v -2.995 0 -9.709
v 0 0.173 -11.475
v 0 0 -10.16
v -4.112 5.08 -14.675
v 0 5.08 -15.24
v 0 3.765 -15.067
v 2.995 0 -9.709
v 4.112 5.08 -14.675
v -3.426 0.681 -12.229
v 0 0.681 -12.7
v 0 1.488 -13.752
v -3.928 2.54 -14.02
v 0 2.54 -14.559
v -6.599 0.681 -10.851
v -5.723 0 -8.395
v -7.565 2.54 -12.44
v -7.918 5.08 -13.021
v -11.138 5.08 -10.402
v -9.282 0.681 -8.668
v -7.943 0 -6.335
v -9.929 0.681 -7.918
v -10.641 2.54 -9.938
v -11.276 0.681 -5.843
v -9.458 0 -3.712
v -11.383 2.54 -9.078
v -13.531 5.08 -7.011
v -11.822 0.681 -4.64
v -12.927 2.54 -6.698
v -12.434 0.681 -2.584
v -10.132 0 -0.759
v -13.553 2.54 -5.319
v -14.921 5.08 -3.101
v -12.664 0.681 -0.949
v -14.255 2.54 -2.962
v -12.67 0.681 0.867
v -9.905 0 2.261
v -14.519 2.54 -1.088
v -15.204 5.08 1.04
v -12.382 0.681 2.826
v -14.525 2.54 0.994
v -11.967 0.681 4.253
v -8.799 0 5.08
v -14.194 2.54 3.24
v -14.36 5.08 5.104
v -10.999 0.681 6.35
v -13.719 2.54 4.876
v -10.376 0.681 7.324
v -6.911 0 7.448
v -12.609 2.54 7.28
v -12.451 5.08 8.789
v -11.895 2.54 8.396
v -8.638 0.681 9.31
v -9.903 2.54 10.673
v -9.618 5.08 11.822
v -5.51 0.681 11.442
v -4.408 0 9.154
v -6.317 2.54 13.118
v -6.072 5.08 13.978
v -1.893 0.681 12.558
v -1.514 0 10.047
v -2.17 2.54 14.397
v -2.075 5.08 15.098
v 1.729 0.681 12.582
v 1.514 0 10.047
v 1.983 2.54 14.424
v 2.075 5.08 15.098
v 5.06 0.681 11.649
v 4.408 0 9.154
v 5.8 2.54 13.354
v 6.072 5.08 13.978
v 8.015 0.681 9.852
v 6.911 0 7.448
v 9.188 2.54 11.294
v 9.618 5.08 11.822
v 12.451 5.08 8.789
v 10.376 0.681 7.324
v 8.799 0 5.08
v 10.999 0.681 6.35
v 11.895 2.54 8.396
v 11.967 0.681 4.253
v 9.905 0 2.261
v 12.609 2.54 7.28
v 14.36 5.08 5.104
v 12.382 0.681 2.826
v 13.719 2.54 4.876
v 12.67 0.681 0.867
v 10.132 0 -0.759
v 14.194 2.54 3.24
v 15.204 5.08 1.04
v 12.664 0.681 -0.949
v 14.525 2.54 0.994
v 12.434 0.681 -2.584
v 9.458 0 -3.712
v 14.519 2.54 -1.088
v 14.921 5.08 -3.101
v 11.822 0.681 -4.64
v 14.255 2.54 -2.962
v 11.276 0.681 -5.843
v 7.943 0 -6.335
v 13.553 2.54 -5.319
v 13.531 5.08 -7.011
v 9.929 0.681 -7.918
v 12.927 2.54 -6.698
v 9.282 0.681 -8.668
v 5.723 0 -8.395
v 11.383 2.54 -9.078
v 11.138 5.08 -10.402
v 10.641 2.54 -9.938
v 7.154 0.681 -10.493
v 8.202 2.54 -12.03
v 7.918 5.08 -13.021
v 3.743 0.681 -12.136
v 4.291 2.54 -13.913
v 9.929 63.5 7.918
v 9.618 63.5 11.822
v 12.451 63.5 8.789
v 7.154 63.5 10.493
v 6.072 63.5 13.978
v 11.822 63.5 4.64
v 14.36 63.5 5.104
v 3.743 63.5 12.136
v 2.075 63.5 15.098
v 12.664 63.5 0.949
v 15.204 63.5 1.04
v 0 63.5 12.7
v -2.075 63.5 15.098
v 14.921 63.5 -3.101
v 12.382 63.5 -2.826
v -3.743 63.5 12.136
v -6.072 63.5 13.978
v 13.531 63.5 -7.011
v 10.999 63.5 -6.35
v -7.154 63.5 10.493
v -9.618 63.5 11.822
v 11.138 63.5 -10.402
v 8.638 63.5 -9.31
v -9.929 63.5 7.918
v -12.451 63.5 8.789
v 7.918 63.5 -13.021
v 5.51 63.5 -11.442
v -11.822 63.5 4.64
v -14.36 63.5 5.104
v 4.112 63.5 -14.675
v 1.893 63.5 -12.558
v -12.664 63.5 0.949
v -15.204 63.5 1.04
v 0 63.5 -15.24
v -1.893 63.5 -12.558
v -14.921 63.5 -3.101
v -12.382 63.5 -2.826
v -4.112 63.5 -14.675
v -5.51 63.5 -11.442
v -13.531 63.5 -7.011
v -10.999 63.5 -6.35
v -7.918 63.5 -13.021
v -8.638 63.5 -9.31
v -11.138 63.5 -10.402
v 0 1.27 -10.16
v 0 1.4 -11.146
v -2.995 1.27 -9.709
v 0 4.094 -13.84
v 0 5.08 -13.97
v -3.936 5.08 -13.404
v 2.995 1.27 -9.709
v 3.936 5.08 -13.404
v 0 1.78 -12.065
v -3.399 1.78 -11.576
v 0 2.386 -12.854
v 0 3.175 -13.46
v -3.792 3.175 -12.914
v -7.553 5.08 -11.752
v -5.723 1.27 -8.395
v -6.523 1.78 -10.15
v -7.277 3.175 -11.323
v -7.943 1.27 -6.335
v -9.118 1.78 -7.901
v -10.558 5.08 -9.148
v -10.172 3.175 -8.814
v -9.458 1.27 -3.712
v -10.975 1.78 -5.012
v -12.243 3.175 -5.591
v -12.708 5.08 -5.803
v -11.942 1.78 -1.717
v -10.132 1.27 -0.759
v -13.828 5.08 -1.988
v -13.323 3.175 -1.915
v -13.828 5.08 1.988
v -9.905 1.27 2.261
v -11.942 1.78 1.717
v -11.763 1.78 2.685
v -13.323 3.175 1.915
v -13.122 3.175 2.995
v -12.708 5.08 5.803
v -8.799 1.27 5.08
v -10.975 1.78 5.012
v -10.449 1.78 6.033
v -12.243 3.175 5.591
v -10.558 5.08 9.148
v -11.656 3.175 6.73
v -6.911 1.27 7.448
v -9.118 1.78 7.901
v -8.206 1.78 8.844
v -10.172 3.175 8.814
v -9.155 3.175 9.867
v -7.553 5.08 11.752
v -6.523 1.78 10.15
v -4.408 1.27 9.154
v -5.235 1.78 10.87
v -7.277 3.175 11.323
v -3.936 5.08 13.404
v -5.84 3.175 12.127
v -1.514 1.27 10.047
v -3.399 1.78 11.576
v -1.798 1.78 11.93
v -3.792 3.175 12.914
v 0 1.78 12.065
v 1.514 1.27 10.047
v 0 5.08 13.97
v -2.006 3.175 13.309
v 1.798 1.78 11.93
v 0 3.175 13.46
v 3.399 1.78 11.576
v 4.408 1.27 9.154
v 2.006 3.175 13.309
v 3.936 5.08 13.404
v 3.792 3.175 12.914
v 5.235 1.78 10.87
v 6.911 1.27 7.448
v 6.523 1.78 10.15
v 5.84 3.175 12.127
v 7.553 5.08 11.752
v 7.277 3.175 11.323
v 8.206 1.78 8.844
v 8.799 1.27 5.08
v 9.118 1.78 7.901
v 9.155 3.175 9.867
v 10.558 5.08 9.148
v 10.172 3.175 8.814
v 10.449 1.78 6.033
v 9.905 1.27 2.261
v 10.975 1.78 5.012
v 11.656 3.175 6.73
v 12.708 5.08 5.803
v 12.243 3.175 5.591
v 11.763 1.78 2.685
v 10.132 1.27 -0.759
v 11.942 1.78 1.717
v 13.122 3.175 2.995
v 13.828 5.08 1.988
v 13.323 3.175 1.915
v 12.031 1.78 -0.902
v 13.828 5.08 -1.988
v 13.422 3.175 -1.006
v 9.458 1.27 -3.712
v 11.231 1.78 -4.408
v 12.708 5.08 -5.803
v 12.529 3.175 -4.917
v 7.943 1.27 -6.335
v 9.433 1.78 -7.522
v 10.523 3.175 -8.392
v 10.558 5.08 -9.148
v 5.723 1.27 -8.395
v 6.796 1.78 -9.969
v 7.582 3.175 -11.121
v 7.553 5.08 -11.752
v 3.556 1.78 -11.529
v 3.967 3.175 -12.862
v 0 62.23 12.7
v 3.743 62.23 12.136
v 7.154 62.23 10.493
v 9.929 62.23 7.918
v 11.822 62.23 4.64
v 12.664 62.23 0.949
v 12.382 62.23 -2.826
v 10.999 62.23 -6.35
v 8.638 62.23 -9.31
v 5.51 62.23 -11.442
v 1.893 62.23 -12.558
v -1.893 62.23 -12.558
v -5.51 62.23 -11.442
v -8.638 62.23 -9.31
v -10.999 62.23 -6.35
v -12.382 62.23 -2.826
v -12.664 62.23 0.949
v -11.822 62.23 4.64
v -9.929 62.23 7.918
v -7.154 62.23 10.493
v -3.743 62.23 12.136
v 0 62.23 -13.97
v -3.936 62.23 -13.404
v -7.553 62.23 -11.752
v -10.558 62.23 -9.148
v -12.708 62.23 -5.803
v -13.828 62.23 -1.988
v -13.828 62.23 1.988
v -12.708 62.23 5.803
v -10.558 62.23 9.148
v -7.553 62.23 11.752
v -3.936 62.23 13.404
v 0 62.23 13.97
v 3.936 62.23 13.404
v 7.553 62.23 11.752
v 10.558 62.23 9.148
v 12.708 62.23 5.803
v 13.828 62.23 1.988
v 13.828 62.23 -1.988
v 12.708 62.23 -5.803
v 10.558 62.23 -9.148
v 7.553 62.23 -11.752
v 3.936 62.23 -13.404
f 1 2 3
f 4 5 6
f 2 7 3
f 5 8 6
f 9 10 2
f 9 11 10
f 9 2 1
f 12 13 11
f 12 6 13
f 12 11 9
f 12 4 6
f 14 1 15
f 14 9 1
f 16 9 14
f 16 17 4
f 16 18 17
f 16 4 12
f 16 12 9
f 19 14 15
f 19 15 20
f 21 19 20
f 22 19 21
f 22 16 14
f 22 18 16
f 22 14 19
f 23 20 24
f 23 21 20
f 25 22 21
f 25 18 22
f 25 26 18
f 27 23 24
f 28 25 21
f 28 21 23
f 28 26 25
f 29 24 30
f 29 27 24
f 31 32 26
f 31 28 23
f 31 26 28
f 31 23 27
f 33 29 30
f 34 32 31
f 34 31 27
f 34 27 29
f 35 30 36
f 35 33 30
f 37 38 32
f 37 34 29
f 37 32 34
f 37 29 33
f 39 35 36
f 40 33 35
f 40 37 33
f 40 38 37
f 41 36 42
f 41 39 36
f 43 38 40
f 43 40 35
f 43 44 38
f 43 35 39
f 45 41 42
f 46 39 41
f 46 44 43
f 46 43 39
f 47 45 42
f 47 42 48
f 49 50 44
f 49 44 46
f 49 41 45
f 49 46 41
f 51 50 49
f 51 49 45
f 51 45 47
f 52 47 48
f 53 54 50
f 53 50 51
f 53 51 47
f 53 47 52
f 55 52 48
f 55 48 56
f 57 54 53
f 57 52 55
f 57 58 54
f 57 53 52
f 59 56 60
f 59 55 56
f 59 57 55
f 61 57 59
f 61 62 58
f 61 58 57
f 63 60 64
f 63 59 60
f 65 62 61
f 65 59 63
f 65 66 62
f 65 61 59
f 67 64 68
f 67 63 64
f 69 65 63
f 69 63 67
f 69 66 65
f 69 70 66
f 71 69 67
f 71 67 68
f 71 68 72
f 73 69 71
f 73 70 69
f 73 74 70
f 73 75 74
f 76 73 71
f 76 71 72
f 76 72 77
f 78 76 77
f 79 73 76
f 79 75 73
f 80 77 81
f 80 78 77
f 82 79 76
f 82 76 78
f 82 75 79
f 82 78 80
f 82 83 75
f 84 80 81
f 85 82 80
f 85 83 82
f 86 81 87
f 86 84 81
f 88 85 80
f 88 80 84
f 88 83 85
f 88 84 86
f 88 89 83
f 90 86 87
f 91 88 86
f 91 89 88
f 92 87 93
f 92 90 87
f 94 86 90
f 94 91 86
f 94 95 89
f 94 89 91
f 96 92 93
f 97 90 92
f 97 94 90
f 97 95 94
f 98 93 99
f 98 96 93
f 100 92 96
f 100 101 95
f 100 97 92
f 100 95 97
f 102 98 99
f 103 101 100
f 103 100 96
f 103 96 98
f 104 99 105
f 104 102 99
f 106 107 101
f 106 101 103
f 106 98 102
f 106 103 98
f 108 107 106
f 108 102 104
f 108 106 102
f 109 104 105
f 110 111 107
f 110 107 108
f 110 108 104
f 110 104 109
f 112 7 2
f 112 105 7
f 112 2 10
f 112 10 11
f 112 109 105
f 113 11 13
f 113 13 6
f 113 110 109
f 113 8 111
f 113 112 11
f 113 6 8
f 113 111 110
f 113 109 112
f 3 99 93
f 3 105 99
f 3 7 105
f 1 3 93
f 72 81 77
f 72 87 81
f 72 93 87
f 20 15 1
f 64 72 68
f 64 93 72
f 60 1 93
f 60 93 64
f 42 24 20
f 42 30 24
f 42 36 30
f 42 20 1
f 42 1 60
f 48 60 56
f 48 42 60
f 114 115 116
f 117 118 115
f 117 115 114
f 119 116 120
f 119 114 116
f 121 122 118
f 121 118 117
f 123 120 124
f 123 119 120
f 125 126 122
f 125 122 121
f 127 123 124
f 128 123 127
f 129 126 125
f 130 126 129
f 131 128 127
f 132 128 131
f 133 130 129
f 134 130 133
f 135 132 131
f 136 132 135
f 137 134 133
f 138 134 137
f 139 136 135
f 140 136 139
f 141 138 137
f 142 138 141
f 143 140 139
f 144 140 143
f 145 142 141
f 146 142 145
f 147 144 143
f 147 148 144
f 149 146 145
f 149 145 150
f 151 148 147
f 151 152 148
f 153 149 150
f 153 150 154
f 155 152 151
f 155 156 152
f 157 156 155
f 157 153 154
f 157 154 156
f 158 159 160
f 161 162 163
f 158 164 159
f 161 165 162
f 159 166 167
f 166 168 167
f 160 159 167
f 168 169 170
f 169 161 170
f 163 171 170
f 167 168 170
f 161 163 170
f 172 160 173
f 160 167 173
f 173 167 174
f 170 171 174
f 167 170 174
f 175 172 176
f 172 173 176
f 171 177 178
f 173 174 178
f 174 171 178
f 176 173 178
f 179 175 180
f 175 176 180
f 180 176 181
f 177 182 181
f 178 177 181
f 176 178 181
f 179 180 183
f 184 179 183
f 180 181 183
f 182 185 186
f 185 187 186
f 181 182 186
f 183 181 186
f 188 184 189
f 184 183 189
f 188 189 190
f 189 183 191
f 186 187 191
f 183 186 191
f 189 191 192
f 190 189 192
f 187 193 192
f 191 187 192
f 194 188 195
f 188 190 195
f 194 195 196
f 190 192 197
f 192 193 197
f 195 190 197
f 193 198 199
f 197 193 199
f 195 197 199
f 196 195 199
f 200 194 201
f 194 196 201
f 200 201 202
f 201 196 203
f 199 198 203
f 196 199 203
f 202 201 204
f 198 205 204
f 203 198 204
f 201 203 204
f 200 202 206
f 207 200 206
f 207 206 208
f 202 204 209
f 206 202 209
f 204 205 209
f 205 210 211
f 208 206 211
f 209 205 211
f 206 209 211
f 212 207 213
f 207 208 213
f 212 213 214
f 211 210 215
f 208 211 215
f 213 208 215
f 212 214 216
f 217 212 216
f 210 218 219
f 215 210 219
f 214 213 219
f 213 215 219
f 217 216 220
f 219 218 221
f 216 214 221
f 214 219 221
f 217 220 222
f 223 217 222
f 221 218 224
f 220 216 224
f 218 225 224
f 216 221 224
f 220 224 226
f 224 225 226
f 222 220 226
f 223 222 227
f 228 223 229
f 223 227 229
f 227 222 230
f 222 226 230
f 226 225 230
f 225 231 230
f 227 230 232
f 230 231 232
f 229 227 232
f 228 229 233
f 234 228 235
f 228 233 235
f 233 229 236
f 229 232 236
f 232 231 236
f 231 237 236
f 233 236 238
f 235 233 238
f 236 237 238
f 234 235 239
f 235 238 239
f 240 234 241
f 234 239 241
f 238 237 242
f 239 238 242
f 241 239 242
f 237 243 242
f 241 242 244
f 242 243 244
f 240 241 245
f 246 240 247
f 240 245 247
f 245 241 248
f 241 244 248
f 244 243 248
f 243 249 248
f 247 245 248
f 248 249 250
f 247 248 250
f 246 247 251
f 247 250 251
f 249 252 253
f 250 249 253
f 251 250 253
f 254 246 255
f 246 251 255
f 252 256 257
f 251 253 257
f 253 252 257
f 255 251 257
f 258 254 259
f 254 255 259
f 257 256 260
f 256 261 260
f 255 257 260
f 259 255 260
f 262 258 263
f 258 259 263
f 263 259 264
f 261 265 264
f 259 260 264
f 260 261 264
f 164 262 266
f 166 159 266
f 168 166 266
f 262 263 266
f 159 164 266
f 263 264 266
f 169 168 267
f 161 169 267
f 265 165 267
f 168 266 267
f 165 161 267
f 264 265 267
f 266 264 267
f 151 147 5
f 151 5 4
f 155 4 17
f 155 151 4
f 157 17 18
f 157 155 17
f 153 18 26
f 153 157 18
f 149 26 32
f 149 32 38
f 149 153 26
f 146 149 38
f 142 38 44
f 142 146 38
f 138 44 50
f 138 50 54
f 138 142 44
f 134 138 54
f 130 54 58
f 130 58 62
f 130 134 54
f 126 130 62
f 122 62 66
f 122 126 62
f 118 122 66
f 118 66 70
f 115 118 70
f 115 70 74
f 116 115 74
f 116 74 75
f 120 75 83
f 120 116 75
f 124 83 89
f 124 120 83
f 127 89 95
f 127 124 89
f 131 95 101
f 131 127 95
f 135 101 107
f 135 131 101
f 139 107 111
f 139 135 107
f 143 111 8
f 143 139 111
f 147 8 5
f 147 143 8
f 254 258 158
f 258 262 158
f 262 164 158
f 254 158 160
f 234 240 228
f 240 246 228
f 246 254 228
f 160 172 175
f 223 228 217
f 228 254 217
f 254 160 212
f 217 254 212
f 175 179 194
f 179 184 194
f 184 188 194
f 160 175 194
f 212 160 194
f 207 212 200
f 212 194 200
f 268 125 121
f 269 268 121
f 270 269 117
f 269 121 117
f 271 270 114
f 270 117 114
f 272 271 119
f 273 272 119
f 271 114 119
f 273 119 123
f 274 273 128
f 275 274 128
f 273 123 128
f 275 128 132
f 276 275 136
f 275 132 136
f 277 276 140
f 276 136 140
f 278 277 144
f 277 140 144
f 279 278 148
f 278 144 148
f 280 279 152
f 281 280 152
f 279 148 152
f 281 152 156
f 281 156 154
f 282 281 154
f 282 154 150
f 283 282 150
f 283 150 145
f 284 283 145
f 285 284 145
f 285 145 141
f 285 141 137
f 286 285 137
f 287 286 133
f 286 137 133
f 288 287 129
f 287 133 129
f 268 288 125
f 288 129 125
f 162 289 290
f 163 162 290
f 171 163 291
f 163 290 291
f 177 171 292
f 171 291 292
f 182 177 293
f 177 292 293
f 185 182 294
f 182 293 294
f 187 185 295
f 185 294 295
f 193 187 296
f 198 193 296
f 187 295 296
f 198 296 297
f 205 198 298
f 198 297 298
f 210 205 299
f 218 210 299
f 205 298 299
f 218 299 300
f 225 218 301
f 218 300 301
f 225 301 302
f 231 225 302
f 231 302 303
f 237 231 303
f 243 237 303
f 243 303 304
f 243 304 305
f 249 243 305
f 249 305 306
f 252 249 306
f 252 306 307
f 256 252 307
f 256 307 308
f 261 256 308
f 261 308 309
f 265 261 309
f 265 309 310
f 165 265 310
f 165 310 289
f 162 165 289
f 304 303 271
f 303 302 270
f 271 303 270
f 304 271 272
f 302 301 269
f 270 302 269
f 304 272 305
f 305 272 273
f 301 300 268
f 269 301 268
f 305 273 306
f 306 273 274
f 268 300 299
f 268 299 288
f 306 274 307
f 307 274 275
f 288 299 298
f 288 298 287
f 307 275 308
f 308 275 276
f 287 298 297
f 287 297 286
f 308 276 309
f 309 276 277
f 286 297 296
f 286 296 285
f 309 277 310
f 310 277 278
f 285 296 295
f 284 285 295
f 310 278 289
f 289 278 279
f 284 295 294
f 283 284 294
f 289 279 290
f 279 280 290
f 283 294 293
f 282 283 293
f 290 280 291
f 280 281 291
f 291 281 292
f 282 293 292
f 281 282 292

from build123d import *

# Parameters (mm, degrees)
SKETCH3_W           = 15.24
SKETCH3_H           = 63.5
FILLET5_R           = 5.08
SHELL5_T            = -1.27
SKETCH9_R           = 13.97
SKETCH9_R_2         = 12.7
BOSS_EXTRUDE5_DEPTH = 1.27


with BuildPart() as part:
    # Sketch3 → Revolve1 (revolve)
    with BuildSketch(Plane(origin=(0, 0, 0), x_dir=(0, 0, -1), z_dir=(1, 0, 0))):
        with Locations((7.62, 31.75)):
            Rectangle(SKETCH3_W, SKETCH3_H)
    revolve(axis=Axis((0, 0, 0), (0, 1, 0)))

    # Fillet5
    fillet5_edges = [part.edges().sort_by_distance(p)[0] for p in [
        (0, 0, 15.24),
    ]]
    fillet(fillet5_edges, radius=FILLET5_R)

    # Shell5
    shell5_openings = [part.faces().sort_by_distance(p)[0] for p in [
        (0, 63.5, 0),
    ]]
    offset(amount=SHELL5_T, openings=shell5_openings, kind=Kind.INTERSECTION)

    # Sketch9 → Boss-Extrude5 (add)
    with BuildSketch(Plane(origin=(0, 63.5, 0), x_dir=(1, 0, 0), z_dir=(0, 1, 0))):
        with Locations(Location((0, 0, 0), (0, 0, 90))):
            Circle(SKETCH9_R)
        with Locations(Location((0, 0, 0), (0, 0, 270))):
            Circle(SKETCH9_R_2, mode=Mode.SUBTRACT)
    extrude(amount=-BOSS_EXTRUDE5_DEPTH)


solid = part.part
